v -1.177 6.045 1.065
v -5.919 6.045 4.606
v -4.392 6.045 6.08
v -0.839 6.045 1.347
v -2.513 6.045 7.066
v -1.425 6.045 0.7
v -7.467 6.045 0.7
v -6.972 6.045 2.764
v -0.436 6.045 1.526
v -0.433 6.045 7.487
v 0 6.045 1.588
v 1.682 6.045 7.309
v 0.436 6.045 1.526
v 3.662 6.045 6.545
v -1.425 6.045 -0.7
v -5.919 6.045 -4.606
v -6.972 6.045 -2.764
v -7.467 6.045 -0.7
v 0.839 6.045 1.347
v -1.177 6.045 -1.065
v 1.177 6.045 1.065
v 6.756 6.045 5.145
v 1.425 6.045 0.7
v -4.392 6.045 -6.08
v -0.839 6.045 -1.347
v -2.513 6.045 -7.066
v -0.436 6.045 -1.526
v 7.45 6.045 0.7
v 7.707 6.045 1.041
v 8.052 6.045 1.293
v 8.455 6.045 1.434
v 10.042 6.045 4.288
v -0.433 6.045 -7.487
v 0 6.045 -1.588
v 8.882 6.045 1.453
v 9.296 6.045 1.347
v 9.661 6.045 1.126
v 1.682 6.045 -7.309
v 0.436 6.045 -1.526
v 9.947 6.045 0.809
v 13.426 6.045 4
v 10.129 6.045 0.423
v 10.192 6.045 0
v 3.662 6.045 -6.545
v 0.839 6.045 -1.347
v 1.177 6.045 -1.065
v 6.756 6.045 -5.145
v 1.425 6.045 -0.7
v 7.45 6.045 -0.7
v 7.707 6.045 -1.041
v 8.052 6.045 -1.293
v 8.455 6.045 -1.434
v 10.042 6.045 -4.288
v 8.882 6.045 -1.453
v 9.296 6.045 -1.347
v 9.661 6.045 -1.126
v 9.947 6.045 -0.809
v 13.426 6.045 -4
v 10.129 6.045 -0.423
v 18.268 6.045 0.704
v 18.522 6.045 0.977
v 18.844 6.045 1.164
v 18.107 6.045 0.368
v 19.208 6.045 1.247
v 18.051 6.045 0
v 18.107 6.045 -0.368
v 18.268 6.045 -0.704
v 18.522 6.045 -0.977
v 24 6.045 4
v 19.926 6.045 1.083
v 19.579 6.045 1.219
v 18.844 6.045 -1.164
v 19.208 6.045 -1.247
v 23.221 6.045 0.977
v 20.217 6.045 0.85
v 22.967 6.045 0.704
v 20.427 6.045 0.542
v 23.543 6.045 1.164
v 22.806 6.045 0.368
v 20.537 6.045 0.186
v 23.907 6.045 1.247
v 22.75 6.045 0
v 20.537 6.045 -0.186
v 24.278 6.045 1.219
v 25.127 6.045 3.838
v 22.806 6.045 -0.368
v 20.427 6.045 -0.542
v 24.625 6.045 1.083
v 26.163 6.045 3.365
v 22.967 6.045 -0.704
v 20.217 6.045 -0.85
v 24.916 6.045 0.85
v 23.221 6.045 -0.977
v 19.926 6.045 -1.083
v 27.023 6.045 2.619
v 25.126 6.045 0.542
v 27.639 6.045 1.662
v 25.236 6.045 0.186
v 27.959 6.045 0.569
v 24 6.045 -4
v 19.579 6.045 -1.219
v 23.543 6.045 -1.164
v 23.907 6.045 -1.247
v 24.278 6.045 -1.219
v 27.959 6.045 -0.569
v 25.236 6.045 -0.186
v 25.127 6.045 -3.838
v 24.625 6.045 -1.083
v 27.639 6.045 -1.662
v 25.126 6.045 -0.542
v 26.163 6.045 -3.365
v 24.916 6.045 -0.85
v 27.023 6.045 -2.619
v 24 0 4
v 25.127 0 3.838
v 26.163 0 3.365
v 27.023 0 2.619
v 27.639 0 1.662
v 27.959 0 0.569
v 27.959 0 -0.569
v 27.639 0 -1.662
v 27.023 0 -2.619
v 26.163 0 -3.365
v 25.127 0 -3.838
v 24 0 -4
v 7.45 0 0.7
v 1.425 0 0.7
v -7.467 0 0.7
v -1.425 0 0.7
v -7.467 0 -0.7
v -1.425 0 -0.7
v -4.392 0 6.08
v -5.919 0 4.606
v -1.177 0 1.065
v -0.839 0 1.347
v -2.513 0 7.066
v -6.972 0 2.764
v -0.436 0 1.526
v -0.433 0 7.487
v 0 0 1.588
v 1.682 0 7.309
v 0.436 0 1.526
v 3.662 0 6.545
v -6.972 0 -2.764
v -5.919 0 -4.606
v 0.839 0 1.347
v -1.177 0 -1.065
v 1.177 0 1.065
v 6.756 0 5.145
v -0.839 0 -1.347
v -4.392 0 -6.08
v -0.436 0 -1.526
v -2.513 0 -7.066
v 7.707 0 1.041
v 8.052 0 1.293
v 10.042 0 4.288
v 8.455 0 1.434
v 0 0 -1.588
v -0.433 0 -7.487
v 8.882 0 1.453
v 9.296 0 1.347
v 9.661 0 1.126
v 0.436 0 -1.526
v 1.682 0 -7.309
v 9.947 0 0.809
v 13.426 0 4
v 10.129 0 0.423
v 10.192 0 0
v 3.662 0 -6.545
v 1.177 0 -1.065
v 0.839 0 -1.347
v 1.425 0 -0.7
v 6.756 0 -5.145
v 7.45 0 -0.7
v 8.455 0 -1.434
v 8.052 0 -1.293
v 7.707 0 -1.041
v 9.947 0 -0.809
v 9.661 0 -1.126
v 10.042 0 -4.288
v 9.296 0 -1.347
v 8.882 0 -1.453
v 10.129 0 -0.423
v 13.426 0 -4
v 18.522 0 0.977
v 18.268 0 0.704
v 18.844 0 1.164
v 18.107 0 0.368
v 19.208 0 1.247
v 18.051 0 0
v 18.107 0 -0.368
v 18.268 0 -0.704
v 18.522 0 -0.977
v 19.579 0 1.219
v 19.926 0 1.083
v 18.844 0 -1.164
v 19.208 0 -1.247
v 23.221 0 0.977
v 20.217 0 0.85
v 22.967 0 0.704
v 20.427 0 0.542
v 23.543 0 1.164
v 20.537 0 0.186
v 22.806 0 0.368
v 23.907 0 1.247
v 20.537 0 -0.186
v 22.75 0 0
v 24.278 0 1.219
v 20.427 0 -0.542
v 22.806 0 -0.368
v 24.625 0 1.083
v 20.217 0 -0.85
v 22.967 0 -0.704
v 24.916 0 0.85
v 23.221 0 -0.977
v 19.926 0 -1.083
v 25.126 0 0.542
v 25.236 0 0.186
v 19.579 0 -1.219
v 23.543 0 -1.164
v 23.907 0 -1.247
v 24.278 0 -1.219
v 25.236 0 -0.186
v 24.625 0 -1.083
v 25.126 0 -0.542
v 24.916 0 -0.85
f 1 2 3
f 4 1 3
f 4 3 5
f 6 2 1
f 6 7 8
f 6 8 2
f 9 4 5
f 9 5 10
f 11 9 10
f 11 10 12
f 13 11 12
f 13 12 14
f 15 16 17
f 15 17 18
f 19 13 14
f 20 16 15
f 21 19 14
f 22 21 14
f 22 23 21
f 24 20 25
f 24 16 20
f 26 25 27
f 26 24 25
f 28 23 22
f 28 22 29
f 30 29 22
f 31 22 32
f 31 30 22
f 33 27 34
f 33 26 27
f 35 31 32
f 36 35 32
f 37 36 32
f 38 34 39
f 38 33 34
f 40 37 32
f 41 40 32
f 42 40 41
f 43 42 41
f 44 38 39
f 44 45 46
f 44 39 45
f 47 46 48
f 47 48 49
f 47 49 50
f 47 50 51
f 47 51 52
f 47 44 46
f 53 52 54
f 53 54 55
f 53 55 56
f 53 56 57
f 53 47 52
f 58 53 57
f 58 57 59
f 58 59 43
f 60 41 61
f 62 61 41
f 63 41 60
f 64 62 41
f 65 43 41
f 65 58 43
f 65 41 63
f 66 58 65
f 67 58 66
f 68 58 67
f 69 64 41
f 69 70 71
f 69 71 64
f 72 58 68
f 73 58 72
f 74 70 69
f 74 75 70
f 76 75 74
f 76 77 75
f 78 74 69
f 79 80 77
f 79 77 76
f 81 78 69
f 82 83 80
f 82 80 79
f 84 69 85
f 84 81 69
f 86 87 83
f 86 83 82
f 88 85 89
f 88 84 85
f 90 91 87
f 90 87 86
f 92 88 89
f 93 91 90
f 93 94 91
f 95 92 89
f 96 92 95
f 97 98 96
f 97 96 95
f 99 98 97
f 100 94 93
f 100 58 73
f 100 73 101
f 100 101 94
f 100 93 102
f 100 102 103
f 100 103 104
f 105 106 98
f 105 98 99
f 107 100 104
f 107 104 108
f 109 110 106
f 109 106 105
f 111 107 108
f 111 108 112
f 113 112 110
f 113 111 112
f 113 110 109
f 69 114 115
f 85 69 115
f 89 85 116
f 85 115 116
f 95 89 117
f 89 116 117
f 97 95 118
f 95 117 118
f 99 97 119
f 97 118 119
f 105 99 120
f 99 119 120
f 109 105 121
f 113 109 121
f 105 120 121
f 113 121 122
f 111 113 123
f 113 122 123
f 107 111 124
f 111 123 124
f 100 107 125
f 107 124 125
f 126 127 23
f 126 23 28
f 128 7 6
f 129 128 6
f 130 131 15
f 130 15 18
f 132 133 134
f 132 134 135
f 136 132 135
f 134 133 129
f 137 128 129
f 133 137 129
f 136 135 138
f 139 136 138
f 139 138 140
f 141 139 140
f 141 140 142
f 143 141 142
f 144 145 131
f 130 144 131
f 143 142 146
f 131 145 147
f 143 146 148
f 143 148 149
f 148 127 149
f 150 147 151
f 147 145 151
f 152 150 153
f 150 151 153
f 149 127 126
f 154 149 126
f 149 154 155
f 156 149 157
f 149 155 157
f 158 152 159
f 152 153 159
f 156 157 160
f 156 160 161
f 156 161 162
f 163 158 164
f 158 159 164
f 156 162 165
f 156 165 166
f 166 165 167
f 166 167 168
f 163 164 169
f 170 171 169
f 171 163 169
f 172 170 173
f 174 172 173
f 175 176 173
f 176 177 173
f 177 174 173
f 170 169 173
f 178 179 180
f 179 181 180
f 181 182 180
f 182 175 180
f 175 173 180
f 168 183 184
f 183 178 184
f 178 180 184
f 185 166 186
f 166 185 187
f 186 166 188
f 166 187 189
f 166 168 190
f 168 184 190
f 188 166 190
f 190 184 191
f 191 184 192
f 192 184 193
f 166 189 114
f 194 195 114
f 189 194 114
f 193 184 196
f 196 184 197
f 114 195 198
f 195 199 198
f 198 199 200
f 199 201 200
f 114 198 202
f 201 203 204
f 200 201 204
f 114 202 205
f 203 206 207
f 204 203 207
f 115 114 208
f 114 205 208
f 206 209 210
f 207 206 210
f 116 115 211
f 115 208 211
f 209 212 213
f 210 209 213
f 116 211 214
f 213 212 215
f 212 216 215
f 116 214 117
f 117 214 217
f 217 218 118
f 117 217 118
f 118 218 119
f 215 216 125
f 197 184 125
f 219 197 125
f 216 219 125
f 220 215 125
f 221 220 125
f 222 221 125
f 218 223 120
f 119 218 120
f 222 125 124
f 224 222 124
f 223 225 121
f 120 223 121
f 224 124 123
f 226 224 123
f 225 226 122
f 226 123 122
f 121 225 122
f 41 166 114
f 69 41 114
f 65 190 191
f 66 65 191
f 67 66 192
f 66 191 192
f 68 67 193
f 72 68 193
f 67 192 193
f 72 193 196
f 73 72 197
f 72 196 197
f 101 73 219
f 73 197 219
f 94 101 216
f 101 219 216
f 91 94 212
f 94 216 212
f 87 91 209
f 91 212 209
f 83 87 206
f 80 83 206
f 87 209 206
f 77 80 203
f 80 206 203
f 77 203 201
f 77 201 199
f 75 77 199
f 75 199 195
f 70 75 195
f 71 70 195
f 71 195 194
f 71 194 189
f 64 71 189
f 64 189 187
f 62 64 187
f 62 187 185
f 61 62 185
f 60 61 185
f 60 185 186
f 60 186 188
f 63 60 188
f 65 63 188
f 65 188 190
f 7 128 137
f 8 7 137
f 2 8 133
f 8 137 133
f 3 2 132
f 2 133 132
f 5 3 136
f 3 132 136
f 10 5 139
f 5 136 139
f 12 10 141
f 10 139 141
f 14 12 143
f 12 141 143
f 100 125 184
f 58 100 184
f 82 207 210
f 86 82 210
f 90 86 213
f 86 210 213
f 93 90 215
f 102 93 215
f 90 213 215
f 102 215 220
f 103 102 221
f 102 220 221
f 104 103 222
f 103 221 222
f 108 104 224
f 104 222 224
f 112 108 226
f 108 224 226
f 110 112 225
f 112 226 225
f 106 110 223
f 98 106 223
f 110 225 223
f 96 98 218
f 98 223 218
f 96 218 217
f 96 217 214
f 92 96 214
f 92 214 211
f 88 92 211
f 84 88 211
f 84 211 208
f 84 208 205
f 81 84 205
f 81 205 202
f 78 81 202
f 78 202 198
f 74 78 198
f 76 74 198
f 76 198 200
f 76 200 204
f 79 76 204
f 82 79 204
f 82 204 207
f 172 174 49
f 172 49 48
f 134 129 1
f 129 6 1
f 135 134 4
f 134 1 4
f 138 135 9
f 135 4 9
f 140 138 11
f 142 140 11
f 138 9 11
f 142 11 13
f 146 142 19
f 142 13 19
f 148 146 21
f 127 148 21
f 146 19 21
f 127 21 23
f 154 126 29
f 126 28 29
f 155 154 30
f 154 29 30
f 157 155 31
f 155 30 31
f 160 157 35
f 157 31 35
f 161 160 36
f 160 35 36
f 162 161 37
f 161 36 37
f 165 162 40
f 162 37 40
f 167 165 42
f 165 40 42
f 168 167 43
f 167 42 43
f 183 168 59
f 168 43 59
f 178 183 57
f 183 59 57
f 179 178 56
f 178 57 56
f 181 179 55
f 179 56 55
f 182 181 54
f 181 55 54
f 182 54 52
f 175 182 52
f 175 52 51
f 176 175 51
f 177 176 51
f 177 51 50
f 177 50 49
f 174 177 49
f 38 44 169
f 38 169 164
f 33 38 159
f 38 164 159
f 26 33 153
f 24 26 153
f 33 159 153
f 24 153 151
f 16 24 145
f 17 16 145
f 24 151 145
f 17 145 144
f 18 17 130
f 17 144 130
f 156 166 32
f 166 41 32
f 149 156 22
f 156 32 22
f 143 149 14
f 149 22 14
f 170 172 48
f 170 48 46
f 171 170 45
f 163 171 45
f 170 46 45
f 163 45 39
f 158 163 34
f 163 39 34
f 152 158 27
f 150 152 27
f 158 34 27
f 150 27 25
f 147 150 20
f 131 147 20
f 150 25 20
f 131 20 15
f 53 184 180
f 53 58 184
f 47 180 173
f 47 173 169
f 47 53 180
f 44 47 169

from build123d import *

# Parameters (mm, degrees)
BOSS_EXTRUDE1_DEPTH         = 6.0452
FILLET1_R                   = 20
TAP_DRILL_FOR_M3X0_5_TAP1_D = 2.5
CUT_EXTRUDE1_REACH          = 31.611
SKETCH6_R                   = 1.5875
SKETCH6_R_2                 = 1.4605
CUT_EXTRUDE2_START          = -6.0452
CUT_EXTRUDE2_DEPTH          = 6.0452


with BuildPart() as part:
    # Sketch1 → Boss-Extrude1 (new body)
    with BuildSketch(Plane(origin=(0, 0, 0), x_dir=(1, 0, 0), z_dir=(0, 1, 0))):
        with BuildLine():
            Line((6.34428877, -4), (24, -4))
            ThreePointArc((24, -4), (28, 0), (24, 4))
            Line((24, 4), (6.34428877, 4))
            ThreePointArc((6.34428877, 4), (-7.5, 0), (6.34428877, -4))
        make_face()
    extrude(amount=BOSS_EXTRUDE1_DEPTH)

    # Fillet1
    fillet1_edges = [part.edges().sort_by_distance(p)[0] for p in [
        (6.34428877, 3.0226, -4),
        (6.34428877, 3.0226, 4),
    ]]
    fillet(fillet1_edges, radius=FILLET1_R)

    # Tap Drill for M3x0.5 Tap1 (through all)
    with Locations(Plane(origin=(0, 6.0452, 0), x_dir=(1, 0, 0), z_dir=(0, 1, 0))):
        with Locations((19.301, 0), (24, 0)):
            Hole(TAP_DRILL_FOR_M3X0_5_TAP1_D / 2)

    # Sketch6 → Cut-Extrude1 (cut, up to next)
    with BuildSketch(Plane(origin=(0, 6.0452, 0), x_dir=(1, 0, 0), z_dir=(0, 1, 0)), mode=Mode.PRIVATE) as cut_extrude1_sk1:
        with Locations(Location((0, 0, 0), (0, 0, 270))):
            Circle(SKETCH6_R)
    cut_extrude1_tool1 = extrude(cut_extrude1_sk1.sketch, amount=-CUT_EXTRUDE1_REACH, mode=Mode.PRIVATE) & part.part
    # Sketch6 → Cut-Extrude1 (cut, up to next)
    with BuildSketch(Plane(origin=(0, 6.0452, 0), x_dir=(1, 0, 0), z_dir=(0, 1, 0)), mode=Mode.PRIVATE) as cut_extrude1_sk2:
        with Locations(Location((8.731458325, 0, 0), (0, 0, 270))):
            Circle(SKETCH6_R_2)
    cut_extrude1_tool2 = extrude(cut_extrude1_sk2.sketch, amount=-CUT_EXTRUDE1_REACH, mode=Mode.PRIVATE) & part.part
    add(cut_extrude1_tool1.solids().sort_by_distance((0, 6.0452, 0))[0], mode=Mode.SUBTRACT)
    add(cut_extrude1_tool2.solids().sort_by_distance((8.731458, 6.0452, 0))[0], mode=Mode.SUBTRACT)

    # Sketch7 → Cut-Extrude2 (cut)
    with BuildSketch(Plane(origin=(0, 6.0452, 0), x_dir=(1, 0, 0), z_dir=(0, 1, 0)).offset(CUT_EXTRUDE2_START)):
        with BuildLine():
            Line((7.449638443, 0.6999986), (-7.467262012, 0.6999986))
            ThreePointArc((-7.467262012, 0.6999986), (-7.5, -1.406e-06), (-7.46726175, -0.7000014))
            Line((-7.46726175, -0.7000014), (7.449639972, -0.7000014))
            ThreePointArc((7.449639972, -0.7000014), (7.270958325, -1.595e-06), (7.449638443, 0.6999986))
        make_face()
    extrude(amount=CUT_EXTRUDE2_DEPTH, mode=Mode.SUBTRACT)


solid = part.part
